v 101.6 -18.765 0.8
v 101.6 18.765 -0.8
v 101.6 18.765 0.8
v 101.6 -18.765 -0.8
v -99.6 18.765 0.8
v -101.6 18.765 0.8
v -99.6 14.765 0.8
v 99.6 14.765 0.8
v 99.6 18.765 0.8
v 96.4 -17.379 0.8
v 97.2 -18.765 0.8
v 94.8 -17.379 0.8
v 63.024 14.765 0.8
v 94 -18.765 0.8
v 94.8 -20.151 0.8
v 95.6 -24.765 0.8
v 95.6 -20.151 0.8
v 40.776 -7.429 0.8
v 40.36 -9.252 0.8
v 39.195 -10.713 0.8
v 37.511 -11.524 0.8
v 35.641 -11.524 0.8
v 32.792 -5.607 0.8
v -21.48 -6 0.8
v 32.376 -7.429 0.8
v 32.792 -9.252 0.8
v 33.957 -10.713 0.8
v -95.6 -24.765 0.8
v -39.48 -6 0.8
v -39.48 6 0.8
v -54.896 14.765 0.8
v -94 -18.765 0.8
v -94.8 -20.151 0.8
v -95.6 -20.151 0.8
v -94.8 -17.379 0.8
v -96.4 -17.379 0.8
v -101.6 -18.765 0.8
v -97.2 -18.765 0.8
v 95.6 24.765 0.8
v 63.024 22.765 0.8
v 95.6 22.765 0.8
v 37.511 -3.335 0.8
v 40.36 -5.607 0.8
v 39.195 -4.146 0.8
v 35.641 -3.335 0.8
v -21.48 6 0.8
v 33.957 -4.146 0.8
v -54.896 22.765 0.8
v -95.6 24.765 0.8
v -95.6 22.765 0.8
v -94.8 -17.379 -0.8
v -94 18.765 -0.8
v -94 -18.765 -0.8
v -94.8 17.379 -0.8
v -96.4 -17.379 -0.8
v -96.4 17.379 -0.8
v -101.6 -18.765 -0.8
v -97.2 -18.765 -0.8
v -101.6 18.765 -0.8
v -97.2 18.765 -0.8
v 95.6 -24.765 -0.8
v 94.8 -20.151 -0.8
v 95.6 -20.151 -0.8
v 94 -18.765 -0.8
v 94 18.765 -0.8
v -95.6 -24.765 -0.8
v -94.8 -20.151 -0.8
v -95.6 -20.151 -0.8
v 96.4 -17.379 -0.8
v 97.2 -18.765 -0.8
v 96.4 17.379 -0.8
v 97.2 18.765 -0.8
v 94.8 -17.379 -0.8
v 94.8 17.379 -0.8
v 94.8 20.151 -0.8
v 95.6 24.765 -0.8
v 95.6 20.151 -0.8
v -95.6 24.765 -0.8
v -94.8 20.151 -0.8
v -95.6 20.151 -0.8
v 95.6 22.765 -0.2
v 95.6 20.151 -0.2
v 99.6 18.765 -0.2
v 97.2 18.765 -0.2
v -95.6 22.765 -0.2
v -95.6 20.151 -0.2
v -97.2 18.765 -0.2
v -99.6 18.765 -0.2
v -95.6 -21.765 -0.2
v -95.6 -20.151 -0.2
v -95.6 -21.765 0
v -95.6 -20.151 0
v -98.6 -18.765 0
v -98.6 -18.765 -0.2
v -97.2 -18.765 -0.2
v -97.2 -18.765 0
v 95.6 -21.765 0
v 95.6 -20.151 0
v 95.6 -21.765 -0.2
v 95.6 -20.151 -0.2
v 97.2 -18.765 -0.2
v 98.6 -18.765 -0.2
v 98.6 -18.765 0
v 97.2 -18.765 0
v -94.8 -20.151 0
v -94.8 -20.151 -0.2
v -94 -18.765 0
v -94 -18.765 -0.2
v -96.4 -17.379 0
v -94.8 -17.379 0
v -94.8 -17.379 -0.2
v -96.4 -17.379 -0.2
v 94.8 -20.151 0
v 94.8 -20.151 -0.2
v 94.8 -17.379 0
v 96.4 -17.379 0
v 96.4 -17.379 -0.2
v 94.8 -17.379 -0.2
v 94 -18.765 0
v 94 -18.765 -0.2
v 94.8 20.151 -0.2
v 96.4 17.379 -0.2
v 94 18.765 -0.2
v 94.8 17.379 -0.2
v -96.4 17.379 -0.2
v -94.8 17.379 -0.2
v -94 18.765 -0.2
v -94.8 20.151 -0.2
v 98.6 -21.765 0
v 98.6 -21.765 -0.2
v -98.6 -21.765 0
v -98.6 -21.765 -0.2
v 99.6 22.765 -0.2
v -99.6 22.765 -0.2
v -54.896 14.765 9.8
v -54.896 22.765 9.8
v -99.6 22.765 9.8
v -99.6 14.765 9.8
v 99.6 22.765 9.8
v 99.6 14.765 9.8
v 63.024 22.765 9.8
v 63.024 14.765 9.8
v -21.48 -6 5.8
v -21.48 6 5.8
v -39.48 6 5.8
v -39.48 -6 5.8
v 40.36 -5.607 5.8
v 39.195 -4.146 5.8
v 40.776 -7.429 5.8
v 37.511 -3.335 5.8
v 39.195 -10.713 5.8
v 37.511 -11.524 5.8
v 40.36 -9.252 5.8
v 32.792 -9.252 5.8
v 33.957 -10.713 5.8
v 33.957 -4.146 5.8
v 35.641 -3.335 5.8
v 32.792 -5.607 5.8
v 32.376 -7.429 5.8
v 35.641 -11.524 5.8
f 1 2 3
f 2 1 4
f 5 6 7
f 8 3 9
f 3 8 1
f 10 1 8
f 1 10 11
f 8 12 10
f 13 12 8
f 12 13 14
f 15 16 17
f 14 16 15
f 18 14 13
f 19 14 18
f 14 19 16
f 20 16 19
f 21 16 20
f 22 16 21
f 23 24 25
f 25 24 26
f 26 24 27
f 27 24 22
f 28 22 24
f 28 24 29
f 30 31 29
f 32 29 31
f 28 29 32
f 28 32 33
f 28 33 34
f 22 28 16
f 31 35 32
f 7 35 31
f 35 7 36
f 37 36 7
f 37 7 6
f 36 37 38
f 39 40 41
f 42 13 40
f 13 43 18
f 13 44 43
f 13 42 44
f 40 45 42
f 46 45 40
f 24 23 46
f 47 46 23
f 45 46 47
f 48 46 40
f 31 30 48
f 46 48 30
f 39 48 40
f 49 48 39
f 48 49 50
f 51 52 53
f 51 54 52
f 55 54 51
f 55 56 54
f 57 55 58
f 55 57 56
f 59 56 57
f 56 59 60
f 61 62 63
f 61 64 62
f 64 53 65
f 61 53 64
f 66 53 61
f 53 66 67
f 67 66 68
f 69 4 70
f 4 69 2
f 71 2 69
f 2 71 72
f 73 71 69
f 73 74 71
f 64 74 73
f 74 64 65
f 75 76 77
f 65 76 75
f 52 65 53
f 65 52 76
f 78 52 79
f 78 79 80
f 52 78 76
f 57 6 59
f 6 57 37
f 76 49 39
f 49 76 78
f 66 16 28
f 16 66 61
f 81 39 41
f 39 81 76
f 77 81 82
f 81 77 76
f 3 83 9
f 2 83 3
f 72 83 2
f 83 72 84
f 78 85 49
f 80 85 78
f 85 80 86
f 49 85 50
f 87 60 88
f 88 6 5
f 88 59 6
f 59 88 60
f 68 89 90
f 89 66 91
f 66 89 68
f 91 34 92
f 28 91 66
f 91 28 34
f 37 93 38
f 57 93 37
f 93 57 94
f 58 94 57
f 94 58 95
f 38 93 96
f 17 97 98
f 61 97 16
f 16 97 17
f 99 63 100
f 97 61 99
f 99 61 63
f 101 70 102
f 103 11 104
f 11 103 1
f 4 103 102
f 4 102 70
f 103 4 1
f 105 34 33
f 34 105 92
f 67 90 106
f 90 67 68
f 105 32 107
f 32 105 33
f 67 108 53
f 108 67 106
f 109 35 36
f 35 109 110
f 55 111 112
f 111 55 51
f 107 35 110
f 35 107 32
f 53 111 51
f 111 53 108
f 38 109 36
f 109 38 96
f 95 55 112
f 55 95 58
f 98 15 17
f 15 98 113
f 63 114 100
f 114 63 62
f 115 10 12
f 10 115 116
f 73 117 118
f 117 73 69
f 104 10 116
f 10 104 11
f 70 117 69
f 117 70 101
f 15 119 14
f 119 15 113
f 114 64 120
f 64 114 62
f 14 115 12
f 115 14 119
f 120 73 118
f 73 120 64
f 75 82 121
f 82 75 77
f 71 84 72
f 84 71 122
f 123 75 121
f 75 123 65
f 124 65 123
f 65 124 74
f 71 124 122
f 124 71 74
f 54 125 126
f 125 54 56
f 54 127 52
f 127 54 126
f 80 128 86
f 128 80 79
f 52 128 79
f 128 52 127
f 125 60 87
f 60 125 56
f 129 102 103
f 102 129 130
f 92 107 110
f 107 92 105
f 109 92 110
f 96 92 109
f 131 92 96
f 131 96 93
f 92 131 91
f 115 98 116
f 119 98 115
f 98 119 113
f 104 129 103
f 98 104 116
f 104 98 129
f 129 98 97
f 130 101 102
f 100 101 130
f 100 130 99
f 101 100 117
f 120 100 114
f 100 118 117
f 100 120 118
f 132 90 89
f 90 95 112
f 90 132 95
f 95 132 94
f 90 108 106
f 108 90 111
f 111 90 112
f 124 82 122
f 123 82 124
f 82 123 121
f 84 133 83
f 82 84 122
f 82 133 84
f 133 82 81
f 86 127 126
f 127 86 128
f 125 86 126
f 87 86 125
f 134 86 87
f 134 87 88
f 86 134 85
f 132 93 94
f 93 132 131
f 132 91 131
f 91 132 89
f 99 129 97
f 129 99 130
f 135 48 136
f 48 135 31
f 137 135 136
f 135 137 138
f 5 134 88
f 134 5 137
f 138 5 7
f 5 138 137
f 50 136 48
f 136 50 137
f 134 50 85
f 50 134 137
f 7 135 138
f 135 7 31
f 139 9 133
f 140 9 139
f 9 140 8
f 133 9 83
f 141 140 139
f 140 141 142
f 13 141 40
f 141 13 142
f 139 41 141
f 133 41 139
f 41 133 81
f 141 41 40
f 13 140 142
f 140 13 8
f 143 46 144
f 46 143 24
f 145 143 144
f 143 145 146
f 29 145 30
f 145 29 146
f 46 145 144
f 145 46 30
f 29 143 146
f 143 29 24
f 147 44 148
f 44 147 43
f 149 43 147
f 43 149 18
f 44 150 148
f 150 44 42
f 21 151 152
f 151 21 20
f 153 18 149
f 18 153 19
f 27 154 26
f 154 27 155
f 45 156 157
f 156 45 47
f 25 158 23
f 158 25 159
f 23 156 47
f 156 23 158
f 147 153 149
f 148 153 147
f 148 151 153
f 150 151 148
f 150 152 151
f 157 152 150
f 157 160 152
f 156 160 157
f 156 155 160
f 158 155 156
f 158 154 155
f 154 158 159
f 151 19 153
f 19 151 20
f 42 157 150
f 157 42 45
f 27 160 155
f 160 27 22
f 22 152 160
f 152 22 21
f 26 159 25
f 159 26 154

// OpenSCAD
// Parameters
pcb_length = 203.2; //[101.6:406.4:0.1]
pcb_width = 49.53; //[24.765:99.06:0.01]
pcb_thickness = 1.6; //[0.8:3.2:0.1]
corner_radius = 3.0; //[1.5:6.0:0.1]
mount_hole_diameter = 3.2; //[2.0:5.0:0.1]
mount_hole_edge_offset_x = 6.0; //[3.0:12.0:0.1]
mount_hole_edge_offset_y = 6.0; //[3.0:12.0:0.1]
hole_clearance_height = 6.0; //[3.0:20.0:0.5]
overlap = 1.0; //[0.5:2.0:0.1]
silkscreen_thickness = 0.2; //[0.1:0.5:0.05]
silkscreen_margin = 3.0; //[1.0:8.0:0.1]
connector_height = 10.0; //[5.0:20.0:0.5]
connector_depth = 8.0; //[4.0:16.0:0.5]
connector_wall_inset = 2.0; //[1.0:6.0:0.1]
component_block_height = 6.0; //[3.0:15.0:0.5]
component_block_size_x = 18.0; //[9.0:36.0:0.5]
component_block_size_y = 12.0; //[6.0:24.0:0.5]

// PCB Main Body
module pcb_main_body() {
  color([0.0, 0.4, 0.2]) // Green for PCB
  cube([pcb_length, pcb_width, pcb_thickness], center=true);
}

// Corner Cut Cylinders
module corner_cut_cyl(pos) {
  translate(pos)
    cylinder(r=corner_radius, h=pcb_thickness + 2*overlap, center=true);
}

// Corner Cut Boxes
module corner_cut_box(pos) {
  translate(pos)
    cube([corner_radius*2, corner_radius*2, pcb_thickness + 2*overlap], center=true);
}

// Mounting Holes
module mount_hole(pos) {
  translate(pos)
    cylinder(r=mount_hole_diameter/2, h=hole_clearance_height, center=true);
}

// Silkscreen Markings
module silkscreen_markings() {
  color([0.85, 0.85, 0.8]) // Off-white for silkscreen
  translate([0, 0, pcb_thickness/2 + silkscreen_thickness/2 - overlap])
    cube([pcb_length - 2*silkscreen_margin, pcb_width - 2*silkscreen_margin, silkscreen_thickness], center=true);
}

// Connector Edge Blocks
module connector_edge_block_1() {
  translate([-pcb_length/2 + (pcb_length*0.22)/2 + connector_wall_inset, pcb_width/2 - connector_depth/2 - connector_wall_inset, pcb_thickness/2 + connector_height/2 - overlap])
    cube([pcb_length*0.22, connector_depth, connector_height], center=true);
}

module connector_edge_block_2() {
  translate([pcb_length/2 - (pcb_length*0.18)/2 - connector_wall_inset, pcb_width/2 - connector_depth/2 - connector_wall_inset, pcb_thickness/2 + connector_height/2 - overlap])
    cube([pcb_length*0.18, connector_depth, connector_height], center=true);
}

// Component Blocks
module component_block_1() {
  translate([-pcb_length*0.15, 0, pcb_thickness/2 + component_block_height/2 - overlap])
    cube([component_block_size_x, component_block_size_y, component_block_height], center=true);
}

module component_cyl_1() {
  translate([pcb_length*0.18, -pcb_width*0.15, pcb_thickness/2 + component_block_height/2 - overlap])
    cylinder(r=component_block_size_y*0.35, h=component_block_height, center=true);
}

// Assemble PCB
module pcb_complete() {
  difference() {
    pcb_main_body();
    corner_cut_box([pcb_length/2 - corner_radius, pcb_width/2 - corner_radius, 0]);
    corner_cut_cyl([pcb_length/2 - corner_radius, pcb_width/2 - corner_radius, 0]);
    corner_cut_box([-pcb_length/2 + corner_radius, pcb_width/2 - corner_radius, 0]);
    corner_cut_cyl([-pcb_length/2 + corner_radius, pcb_width/2 - corner_radius, 0]);
    corner_cut_box([-pcb_length/2 + corner_radius, -pcb_width/2 + corner_radius, 0]);
    corner_cut_cyl([-pcb_length/2 + corner_radius, -pcb_width/2 + corner_radius, 0]);
    corner_cut_box([pcb_length/2 - corner_radius, -pcb_width/2 + corner_radius, 0]);
    corner_cut_cyl([pcb_length/2 - corner_radius, -pcb_width/2 + corner_radius, 0]);
    mount_hole([-pcb_length/2 + mount_hole_edge_offset_x, -pcb_width/2 + mount_hole_edge_offset_y, 0]);
    mount_hole([pcb_length/2 - mount_hole_edge_offset_x, -pcb_width/2 + mount_hole_edge_offset_y, 0]);
    mount_hole([pcb_length/2 - mount_hole_edge_offset_x, pcb_width/2 - mount_hole_edge_offset_y, 0]);
    mount_hole([-pcb_length/2 + mount_hole_edge_offset_x, pcb_width/2 - mount_hole_edge_offset_y, 0]);
  }
  union() {
    silkscreen_markings();
    connector_edge_block_1();
    connector_edge_block_2();
    component_block_1();
    component_cyl_1();
  }
}

// Render the complete PCB
pcb_complete();
